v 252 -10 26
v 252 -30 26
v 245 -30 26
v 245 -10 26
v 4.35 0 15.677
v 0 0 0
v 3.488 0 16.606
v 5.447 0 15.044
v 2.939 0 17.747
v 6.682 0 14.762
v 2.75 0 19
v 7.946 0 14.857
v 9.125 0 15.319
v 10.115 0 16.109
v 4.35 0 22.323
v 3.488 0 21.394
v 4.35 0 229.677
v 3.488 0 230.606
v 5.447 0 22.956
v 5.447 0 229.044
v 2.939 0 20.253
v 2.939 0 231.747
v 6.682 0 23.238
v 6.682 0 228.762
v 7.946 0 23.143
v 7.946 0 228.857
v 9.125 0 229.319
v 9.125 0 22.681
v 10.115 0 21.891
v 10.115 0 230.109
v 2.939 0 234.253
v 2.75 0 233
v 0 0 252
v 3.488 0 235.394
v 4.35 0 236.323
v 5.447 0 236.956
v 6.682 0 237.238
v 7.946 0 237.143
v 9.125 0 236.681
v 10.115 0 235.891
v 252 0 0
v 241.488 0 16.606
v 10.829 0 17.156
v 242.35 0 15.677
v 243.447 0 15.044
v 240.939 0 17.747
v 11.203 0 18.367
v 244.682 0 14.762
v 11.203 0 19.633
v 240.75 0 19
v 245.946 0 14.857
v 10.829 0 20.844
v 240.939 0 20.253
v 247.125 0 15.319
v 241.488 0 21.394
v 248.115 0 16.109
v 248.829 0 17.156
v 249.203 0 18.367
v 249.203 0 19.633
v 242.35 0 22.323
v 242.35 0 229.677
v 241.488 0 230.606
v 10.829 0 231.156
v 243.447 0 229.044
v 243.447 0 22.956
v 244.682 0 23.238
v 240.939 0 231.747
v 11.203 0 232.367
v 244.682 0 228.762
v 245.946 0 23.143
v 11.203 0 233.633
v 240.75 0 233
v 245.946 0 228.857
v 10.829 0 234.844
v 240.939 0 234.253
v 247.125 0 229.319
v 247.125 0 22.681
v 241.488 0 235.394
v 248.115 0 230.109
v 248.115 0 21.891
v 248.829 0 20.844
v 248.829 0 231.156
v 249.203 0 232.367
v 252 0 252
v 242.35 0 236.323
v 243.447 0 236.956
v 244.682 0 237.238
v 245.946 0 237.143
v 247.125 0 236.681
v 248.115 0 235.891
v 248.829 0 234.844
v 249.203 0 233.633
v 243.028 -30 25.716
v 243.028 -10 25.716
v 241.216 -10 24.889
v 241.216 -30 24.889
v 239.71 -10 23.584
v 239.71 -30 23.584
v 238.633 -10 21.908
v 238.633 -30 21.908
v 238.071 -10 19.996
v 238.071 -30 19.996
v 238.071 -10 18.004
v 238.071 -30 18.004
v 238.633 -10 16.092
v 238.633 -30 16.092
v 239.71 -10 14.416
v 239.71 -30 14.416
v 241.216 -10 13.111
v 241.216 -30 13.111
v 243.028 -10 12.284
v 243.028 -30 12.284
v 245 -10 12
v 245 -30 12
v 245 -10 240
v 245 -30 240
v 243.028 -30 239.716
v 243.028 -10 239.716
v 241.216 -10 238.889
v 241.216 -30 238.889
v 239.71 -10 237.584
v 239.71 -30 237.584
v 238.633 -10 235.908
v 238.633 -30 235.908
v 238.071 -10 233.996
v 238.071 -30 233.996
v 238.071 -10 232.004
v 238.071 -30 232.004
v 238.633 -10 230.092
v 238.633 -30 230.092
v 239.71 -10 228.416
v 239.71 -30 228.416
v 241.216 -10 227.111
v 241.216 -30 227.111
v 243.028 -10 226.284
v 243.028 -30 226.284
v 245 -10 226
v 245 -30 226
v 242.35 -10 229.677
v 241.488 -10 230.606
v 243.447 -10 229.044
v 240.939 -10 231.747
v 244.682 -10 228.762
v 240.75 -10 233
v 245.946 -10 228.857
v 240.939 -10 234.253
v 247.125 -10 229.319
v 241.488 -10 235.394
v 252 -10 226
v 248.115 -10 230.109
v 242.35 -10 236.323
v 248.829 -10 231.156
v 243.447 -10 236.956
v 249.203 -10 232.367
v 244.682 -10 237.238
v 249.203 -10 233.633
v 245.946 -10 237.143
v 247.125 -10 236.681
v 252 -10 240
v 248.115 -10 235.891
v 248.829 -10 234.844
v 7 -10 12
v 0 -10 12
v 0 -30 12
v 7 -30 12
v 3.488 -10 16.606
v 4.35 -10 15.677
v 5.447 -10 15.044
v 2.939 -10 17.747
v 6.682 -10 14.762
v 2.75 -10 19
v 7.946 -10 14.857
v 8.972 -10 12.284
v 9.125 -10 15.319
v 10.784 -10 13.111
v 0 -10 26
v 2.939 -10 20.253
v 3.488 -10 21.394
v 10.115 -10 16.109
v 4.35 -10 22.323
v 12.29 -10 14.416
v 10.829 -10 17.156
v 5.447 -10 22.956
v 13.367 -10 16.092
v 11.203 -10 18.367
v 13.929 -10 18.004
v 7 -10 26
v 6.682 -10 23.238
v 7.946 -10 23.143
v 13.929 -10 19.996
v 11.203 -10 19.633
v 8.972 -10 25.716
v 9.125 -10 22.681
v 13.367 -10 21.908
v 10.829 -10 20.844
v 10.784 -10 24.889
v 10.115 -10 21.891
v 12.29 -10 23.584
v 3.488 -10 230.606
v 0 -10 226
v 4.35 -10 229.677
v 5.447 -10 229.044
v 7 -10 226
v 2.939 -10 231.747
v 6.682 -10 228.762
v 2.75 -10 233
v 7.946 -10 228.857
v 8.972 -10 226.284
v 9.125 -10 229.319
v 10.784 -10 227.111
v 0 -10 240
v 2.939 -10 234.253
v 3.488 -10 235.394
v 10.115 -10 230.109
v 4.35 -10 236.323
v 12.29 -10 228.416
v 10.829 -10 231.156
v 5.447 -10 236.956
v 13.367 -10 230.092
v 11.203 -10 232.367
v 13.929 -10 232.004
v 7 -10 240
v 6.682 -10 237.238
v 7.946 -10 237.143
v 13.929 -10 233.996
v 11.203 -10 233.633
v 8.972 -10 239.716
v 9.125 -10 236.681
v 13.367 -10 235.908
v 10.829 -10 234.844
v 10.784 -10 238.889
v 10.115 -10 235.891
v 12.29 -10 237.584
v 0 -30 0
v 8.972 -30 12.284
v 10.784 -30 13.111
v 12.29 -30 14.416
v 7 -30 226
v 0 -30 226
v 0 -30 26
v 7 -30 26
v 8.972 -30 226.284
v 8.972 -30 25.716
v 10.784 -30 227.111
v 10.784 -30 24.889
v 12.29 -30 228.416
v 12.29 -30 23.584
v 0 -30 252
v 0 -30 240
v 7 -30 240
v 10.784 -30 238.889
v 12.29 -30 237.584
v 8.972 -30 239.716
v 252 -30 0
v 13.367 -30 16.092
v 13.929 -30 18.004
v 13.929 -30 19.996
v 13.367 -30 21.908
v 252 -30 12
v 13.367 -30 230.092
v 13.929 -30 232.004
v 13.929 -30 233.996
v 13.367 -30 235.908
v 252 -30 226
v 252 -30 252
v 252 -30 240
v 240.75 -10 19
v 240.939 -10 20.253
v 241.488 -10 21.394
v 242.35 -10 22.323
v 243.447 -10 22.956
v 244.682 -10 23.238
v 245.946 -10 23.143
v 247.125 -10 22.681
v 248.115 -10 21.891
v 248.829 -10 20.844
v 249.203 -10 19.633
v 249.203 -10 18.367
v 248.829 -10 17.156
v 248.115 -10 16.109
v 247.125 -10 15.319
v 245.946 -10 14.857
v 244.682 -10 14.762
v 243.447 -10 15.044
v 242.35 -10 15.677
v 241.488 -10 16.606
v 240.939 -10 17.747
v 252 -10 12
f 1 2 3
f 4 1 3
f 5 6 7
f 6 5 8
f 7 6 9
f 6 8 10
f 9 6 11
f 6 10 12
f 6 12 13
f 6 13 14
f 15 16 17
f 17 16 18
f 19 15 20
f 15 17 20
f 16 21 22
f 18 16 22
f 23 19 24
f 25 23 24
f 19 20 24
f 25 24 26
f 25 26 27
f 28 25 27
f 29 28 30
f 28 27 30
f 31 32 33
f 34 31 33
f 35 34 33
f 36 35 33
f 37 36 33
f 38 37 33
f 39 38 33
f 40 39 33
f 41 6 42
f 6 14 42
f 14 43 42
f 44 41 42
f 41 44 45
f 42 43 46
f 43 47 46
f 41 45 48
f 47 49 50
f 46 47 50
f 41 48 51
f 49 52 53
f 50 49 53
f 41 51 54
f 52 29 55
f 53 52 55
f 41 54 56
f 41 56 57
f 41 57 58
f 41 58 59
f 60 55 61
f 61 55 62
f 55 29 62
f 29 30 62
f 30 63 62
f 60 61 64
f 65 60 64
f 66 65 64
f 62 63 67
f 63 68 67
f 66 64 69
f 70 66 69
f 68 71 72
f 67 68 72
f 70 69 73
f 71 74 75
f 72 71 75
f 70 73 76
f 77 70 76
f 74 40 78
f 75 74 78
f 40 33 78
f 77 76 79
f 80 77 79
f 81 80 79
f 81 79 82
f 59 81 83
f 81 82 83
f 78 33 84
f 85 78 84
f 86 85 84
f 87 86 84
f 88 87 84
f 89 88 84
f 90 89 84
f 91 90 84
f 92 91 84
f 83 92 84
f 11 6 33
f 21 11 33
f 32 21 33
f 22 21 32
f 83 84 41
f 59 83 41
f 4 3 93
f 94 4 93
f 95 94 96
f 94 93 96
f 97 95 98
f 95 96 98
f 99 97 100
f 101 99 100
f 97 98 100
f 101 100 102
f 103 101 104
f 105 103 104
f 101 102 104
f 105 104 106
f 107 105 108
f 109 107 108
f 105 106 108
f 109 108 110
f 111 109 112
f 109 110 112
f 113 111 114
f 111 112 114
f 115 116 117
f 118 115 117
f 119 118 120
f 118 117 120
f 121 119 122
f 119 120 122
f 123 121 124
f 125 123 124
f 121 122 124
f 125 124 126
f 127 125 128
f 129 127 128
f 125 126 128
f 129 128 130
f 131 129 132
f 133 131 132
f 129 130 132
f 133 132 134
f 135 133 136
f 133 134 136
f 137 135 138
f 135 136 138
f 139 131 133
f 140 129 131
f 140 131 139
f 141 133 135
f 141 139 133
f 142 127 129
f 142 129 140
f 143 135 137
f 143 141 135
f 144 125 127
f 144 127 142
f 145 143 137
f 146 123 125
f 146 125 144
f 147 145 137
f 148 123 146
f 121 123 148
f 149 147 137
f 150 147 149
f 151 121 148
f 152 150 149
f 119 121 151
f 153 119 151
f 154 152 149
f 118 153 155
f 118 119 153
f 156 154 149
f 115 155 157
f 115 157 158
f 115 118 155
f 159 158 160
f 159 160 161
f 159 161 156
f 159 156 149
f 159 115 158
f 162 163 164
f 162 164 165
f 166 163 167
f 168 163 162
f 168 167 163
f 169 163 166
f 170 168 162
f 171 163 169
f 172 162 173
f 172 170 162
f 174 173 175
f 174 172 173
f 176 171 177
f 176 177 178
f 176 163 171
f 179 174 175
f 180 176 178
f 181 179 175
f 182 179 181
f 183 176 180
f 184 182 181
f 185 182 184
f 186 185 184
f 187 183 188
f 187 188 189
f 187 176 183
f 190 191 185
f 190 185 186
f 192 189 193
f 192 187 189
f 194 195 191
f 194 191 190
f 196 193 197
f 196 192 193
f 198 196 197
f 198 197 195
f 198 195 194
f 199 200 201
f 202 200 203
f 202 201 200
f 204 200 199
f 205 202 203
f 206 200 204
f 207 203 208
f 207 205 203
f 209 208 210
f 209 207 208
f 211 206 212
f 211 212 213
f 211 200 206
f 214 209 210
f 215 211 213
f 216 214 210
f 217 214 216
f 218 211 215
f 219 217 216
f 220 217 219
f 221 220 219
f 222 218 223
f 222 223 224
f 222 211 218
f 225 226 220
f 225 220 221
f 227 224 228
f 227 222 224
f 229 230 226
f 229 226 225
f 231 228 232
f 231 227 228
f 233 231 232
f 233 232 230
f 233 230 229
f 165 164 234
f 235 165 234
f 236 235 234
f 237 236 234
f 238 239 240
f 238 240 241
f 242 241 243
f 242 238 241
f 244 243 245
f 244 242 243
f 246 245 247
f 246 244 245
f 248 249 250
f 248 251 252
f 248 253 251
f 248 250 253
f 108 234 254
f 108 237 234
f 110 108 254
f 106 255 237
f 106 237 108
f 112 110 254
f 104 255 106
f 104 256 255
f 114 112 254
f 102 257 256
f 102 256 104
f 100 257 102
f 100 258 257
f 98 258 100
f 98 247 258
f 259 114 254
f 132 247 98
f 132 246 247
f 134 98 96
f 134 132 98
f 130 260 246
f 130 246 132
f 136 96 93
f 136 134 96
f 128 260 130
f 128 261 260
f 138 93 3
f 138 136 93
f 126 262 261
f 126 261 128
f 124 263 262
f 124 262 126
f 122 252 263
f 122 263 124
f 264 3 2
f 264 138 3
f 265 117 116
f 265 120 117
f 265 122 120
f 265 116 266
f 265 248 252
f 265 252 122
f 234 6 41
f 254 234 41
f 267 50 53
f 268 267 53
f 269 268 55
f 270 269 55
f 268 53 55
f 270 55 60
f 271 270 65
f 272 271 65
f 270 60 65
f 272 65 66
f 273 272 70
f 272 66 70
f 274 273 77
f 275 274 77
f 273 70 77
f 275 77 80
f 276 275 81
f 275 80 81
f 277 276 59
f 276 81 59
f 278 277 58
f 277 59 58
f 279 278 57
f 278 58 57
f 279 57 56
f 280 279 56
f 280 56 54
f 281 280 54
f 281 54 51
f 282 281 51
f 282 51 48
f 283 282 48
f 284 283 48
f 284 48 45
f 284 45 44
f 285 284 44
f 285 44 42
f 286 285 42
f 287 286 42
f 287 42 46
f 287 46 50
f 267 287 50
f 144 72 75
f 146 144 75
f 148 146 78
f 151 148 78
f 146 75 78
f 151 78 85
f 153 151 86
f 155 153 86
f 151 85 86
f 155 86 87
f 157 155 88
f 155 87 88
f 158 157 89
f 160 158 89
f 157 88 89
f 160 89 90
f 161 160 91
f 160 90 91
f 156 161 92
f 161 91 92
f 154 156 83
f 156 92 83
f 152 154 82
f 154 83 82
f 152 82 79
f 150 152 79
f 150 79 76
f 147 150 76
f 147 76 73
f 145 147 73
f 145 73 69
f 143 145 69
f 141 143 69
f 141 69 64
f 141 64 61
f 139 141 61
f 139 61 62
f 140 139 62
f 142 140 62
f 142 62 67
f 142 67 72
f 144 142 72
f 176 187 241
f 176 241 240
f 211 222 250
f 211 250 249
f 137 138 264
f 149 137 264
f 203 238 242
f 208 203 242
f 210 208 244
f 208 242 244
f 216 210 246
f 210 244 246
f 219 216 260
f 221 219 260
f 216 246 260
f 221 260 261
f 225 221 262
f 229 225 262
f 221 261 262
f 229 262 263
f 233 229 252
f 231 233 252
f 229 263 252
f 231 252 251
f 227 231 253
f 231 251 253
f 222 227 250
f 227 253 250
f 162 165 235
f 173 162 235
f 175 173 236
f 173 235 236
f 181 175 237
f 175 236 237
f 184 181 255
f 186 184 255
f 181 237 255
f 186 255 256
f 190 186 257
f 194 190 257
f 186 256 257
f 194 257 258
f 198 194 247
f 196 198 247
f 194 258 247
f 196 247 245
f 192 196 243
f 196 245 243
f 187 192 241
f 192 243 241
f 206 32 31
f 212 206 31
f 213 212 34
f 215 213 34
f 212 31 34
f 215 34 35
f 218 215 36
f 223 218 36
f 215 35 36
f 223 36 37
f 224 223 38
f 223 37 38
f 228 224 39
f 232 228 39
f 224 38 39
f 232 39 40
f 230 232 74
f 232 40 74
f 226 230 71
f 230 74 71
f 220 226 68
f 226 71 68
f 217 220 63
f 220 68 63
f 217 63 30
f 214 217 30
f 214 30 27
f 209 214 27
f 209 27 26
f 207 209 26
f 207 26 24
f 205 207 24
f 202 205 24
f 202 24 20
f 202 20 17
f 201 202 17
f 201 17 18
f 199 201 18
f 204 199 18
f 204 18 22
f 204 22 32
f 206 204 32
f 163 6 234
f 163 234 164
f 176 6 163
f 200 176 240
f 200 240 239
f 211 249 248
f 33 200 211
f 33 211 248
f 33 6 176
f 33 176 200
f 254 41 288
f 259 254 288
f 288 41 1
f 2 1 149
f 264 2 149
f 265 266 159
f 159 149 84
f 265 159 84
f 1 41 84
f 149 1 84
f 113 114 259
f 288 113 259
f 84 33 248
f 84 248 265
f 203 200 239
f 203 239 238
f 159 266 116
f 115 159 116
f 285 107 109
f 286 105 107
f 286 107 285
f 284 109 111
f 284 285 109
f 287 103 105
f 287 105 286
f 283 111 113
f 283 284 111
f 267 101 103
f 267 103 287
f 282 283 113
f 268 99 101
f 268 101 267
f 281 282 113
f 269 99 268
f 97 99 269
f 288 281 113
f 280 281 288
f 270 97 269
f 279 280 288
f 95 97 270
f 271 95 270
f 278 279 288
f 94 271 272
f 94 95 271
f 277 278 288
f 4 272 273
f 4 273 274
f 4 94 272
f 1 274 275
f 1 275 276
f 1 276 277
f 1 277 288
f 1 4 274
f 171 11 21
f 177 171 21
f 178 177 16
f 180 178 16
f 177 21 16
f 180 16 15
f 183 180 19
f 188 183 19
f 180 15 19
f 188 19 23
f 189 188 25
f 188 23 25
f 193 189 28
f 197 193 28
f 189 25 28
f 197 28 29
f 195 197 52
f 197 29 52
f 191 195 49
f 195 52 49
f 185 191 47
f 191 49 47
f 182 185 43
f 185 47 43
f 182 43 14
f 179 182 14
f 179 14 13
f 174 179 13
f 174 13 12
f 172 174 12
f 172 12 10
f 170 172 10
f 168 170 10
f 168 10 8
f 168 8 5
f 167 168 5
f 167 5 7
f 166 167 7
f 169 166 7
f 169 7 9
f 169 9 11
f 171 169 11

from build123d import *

# Parameters (mm, degrees)
F0_W     = 252
F0_H     = 252
F1_DEPTH = 30
F3_DEPTH = 20
F5_D     = 8.5


with BuildPart() as f1:
    # F0 (on Front) → F1 (new body)
    with BuildSketch(Plane.XZ):
        with Locations((126, 126)):
            Rectangle(F0_W, F0_H)
    extrude(amount=F1_DEPTH)

    # F2 (on face) → F3 (cut)
    with BuildSketch(Plane.XZ.offset(30)):
        with BuildLine():
            Line((7, 26), (0, 26))
            Line((0, 26), (0, 12))
            Line((0, 12), (7, 12))
            ThreePointArc((7, 12), (14, 19), (7, 26))
        make_face()
        with BuildLine():
            Line((245, 12), (252, 12))
            Line((252, 12), (252, 26))
            Line((252, 26), (245, 26))
            ThreePointArc((245, 26), (238, 19), (245, 12))
        make_face()
        with BuildLine():
            Line((252, 226), (252, 240))
            Line((252, 240), (245, 240))
            ThreePointArc((245, 240), (238, 233), (245, 226))
            Line((245, 226), (252, 226))
        make_face()
        with BuildLine():
            Line((0, 233), (0, 226))
            Line((0, 226), (7, 226))
            ThreePointArc((7, 226), (14, 233), (7, 240))
            Line((7, 240), (0, 240))
            Line((0, 240), (0, 233))
        make_face()
    extrude(amount=-F3_DEPTH, mode=Mode.SUBTRACT)

    # F5 (through all)
    with Locations(Plane.XZ.offset(10)):
        with Locations((7, 233), (245, 233), (245, 19), (7, 19)):
            Hole(F5_D / 2)


solid = f1.part
